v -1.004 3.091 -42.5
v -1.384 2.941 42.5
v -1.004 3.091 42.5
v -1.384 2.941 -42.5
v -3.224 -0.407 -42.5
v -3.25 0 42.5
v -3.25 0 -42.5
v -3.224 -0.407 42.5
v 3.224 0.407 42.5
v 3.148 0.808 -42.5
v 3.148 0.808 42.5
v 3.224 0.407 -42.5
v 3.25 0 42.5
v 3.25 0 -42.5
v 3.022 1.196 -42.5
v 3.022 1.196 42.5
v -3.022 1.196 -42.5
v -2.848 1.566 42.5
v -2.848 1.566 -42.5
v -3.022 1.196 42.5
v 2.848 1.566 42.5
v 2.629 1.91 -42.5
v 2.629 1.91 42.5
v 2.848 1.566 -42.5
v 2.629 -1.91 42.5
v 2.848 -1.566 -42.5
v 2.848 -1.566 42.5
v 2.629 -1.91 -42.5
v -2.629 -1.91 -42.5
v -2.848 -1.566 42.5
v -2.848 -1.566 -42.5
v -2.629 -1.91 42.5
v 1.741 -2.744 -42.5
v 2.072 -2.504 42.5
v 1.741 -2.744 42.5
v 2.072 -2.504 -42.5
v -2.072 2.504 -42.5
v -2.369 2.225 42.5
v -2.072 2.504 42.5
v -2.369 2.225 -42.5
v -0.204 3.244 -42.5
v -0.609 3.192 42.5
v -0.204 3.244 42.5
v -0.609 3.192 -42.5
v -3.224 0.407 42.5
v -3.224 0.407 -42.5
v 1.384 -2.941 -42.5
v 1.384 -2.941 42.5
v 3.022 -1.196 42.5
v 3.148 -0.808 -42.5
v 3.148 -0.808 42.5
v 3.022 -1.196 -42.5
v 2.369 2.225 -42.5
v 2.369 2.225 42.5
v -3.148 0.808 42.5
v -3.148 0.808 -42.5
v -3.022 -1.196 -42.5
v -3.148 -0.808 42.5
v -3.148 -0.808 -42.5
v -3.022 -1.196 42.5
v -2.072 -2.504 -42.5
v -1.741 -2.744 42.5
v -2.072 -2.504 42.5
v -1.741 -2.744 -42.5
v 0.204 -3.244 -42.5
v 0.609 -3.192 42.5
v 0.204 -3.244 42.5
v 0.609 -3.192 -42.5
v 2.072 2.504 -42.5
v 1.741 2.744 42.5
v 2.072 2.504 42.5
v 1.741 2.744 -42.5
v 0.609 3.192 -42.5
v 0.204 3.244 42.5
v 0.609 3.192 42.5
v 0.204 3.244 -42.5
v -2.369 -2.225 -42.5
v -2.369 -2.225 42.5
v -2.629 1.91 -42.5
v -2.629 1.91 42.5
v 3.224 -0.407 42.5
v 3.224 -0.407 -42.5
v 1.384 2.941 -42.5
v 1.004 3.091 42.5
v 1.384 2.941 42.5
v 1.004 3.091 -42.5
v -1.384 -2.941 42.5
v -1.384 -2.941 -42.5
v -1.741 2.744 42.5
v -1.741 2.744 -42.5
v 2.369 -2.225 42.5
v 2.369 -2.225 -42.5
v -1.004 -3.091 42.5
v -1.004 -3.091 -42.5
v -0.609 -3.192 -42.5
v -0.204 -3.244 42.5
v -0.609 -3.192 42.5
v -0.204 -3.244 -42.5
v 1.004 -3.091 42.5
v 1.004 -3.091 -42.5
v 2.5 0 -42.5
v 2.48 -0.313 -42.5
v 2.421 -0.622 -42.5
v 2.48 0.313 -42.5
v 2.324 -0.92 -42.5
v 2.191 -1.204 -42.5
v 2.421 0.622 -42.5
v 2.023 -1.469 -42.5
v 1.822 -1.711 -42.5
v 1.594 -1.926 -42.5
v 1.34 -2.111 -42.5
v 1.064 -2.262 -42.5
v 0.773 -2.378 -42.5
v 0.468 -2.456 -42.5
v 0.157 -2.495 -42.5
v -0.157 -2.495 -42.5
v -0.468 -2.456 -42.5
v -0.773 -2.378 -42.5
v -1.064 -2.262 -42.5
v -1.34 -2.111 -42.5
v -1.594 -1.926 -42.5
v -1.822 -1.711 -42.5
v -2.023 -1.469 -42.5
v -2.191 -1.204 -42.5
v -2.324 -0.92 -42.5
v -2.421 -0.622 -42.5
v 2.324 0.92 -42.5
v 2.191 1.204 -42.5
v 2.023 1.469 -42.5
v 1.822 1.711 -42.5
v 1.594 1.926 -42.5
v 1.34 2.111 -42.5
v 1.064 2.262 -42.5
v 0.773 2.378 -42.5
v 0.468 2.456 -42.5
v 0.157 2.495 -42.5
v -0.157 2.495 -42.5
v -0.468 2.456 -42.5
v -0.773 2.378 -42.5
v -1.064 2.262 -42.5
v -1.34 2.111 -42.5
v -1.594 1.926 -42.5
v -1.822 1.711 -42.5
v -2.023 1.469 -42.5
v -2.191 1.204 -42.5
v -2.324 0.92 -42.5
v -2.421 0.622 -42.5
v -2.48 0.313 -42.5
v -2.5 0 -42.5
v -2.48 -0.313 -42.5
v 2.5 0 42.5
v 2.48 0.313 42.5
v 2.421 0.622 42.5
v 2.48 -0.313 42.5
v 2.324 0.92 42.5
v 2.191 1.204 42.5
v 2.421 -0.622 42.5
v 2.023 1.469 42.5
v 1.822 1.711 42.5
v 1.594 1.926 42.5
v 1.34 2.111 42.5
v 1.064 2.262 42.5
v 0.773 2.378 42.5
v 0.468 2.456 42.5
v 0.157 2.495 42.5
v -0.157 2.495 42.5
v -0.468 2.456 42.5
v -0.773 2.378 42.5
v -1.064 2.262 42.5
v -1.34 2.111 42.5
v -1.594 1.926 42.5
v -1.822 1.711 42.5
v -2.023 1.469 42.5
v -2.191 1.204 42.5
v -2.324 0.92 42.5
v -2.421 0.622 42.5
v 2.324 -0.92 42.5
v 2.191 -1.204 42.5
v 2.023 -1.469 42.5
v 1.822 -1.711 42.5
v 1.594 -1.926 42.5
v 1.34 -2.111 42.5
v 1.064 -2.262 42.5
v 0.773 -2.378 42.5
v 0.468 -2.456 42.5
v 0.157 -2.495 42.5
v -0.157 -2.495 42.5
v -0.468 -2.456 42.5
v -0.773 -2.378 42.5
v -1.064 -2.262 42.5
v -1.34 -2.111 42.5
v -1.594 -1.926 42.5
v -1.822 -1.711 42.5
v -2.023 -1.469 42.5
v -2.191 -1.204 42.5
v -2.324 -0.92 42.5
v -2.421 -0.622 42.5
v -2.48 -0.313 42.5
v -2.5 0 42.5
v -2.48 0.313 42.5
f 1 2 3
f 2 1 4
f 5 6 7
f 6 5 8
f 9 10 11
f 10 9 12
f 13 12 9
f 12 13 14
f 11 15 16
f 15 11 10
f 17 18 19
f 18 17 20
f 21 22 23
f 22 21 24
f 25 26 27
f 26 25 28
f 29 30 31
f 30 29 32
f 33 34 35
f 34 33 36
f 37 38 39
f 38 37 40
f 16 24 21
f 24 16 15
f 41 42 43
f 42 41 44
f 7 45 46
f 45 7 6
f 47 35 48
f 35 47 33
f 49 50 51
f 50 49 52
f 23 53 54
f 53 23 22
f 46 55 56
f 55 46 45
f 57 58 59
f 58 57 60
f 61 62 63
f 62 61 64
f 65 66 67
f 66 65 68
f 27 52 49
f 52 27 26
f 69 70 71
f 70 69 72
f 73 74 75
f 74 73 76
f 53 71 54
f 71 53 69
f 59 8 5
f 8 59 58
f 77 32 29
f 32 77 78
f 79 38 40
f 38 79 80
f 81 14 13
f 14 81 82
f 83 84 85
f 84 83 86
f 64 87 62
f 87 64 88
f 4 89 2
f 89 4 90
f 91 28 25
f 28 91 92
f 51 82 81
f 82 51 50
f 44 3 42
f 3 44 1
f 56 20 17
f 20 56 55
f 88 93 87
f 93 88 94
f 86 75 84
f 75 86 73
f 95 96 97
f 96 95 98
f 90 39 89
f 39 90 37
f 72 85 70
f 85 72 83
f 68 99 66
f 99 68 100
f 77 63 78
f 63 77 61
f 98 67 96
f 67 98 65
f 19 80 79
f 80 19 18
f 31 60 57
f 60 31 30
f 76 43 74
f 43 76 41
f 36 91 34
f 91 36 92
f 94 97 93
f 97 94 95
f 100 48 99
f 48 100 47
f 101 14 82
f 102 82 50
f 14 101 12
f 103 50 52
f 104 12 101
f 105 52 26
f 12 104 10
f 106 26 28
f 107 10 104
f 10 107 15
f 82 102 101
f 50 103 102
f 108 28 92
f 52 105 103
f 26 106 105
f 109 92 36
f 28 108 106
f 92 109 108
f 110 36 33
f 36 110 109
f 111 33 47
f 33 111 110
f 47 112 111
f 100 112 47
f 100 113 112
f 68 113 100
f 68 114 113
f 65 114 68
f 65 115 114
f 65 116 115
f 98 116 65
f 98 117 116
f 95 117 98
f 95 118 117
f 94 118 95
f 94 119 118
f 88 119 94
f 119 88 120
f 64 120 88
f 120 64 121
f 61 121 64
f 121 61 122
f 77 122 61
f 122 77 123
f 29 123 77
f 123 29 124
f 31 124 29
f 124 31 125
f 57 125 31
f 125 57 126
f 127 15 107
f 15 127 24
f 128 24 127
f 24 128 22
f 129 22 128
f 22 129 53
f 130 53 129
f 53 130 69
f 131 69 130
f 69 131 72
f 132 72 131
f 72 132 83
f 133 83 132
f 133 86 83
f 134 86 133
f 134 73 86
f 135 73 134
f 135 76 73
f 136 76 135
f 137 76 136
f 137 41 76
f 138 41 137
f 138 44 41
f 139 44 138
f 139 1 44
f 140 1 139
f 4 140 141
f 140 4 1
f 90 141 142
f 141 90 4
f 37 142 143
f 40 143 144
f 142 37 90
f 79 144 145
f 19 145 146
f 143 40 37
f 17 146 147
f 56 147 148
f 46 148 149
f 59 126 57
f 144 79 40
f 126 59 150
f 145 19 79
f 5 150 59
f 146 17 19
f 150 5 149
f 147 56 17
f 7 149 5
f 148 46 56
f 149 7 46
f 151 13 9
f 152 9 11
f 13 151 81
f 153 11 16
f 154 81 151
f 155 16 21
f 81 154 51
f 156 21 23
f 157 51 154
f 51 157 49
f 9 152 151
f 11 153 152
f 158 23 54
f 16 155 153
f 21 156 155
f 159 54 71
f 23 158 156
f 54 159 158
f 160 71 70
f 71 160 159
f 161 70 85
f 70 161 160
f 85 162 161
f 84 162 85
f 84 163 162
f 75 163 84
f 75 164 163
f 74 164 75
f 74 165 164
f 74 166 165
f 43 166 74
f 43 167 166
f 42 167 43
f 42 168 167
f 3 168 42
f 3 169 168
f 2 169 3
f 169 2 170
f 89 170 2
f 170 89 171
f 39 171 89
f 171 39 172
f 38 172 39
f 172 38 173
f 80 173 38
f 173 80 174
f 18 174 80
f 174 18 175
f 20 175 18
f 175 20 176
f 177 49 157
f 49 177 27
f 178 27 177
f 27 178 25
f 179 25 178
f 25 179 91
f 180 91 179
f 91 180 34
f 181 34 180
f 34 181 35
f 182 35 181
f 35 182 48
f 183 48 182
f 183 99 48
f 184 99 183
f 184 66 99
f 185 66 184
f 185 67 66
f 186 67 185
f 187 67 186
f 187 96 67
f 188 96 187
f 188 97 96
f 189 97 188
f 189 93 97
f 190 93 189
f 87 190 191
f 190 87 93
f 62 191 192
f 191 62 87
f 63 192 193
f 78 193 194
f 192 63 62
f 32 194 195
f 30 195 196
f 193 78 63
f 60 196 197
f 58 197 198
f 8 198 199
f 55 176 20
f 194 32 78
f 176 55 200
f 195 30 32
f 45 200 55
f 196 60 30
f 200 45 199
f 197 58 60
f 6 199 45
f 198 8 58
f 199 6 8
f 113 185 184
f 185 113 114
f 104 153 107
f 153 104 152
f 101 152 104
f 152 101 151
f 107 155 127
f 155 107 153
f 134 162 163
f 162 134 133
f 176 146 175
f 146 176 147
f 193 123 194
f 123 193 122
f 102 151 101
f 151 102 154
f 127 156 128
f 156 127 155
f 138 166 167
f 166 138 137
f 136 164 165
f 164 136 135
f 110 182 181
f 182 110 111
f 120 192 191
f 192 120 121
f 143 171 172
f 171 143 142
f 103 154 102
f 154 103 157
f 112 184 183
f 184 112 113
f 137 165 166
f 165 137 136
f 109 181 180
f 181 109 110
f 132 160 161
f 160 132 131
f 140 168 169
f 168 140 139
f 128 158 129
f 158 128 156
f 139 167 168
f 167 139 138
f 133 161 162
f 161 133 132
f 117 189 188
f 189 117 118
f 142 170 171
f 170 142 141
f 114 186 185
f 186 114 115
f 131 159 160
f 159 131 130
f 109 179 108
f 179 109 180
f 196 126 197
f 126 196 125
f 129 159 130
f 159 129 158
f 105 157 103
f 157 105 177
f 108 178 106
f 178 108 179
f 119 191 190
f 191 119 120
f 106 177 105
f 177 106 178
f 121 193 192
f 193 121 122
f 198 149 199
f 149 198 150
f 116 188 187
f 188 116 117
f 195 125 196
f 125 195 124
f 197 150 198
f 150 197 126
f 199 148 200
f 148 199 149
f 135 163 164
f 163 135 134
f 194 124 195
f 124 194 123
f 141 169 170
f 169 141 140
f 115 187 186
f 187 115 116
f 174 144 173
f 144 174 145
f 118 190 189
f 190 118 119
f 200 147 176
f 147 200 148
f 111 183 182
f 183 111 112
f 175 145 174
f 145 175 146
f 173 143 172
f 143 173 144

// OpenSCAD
$fn = 50;


difference() {
	union() {
		translate(v = [0, 0, -42.5000000000]) {
			cylinder(h = 85, r = 3.2500000000);
		}
	}
	union() {
		translate(v = [0, 0, -100.0000000000]) {
			cylinder(h = 200, r = 2.5000000000);
		}
	}
}
